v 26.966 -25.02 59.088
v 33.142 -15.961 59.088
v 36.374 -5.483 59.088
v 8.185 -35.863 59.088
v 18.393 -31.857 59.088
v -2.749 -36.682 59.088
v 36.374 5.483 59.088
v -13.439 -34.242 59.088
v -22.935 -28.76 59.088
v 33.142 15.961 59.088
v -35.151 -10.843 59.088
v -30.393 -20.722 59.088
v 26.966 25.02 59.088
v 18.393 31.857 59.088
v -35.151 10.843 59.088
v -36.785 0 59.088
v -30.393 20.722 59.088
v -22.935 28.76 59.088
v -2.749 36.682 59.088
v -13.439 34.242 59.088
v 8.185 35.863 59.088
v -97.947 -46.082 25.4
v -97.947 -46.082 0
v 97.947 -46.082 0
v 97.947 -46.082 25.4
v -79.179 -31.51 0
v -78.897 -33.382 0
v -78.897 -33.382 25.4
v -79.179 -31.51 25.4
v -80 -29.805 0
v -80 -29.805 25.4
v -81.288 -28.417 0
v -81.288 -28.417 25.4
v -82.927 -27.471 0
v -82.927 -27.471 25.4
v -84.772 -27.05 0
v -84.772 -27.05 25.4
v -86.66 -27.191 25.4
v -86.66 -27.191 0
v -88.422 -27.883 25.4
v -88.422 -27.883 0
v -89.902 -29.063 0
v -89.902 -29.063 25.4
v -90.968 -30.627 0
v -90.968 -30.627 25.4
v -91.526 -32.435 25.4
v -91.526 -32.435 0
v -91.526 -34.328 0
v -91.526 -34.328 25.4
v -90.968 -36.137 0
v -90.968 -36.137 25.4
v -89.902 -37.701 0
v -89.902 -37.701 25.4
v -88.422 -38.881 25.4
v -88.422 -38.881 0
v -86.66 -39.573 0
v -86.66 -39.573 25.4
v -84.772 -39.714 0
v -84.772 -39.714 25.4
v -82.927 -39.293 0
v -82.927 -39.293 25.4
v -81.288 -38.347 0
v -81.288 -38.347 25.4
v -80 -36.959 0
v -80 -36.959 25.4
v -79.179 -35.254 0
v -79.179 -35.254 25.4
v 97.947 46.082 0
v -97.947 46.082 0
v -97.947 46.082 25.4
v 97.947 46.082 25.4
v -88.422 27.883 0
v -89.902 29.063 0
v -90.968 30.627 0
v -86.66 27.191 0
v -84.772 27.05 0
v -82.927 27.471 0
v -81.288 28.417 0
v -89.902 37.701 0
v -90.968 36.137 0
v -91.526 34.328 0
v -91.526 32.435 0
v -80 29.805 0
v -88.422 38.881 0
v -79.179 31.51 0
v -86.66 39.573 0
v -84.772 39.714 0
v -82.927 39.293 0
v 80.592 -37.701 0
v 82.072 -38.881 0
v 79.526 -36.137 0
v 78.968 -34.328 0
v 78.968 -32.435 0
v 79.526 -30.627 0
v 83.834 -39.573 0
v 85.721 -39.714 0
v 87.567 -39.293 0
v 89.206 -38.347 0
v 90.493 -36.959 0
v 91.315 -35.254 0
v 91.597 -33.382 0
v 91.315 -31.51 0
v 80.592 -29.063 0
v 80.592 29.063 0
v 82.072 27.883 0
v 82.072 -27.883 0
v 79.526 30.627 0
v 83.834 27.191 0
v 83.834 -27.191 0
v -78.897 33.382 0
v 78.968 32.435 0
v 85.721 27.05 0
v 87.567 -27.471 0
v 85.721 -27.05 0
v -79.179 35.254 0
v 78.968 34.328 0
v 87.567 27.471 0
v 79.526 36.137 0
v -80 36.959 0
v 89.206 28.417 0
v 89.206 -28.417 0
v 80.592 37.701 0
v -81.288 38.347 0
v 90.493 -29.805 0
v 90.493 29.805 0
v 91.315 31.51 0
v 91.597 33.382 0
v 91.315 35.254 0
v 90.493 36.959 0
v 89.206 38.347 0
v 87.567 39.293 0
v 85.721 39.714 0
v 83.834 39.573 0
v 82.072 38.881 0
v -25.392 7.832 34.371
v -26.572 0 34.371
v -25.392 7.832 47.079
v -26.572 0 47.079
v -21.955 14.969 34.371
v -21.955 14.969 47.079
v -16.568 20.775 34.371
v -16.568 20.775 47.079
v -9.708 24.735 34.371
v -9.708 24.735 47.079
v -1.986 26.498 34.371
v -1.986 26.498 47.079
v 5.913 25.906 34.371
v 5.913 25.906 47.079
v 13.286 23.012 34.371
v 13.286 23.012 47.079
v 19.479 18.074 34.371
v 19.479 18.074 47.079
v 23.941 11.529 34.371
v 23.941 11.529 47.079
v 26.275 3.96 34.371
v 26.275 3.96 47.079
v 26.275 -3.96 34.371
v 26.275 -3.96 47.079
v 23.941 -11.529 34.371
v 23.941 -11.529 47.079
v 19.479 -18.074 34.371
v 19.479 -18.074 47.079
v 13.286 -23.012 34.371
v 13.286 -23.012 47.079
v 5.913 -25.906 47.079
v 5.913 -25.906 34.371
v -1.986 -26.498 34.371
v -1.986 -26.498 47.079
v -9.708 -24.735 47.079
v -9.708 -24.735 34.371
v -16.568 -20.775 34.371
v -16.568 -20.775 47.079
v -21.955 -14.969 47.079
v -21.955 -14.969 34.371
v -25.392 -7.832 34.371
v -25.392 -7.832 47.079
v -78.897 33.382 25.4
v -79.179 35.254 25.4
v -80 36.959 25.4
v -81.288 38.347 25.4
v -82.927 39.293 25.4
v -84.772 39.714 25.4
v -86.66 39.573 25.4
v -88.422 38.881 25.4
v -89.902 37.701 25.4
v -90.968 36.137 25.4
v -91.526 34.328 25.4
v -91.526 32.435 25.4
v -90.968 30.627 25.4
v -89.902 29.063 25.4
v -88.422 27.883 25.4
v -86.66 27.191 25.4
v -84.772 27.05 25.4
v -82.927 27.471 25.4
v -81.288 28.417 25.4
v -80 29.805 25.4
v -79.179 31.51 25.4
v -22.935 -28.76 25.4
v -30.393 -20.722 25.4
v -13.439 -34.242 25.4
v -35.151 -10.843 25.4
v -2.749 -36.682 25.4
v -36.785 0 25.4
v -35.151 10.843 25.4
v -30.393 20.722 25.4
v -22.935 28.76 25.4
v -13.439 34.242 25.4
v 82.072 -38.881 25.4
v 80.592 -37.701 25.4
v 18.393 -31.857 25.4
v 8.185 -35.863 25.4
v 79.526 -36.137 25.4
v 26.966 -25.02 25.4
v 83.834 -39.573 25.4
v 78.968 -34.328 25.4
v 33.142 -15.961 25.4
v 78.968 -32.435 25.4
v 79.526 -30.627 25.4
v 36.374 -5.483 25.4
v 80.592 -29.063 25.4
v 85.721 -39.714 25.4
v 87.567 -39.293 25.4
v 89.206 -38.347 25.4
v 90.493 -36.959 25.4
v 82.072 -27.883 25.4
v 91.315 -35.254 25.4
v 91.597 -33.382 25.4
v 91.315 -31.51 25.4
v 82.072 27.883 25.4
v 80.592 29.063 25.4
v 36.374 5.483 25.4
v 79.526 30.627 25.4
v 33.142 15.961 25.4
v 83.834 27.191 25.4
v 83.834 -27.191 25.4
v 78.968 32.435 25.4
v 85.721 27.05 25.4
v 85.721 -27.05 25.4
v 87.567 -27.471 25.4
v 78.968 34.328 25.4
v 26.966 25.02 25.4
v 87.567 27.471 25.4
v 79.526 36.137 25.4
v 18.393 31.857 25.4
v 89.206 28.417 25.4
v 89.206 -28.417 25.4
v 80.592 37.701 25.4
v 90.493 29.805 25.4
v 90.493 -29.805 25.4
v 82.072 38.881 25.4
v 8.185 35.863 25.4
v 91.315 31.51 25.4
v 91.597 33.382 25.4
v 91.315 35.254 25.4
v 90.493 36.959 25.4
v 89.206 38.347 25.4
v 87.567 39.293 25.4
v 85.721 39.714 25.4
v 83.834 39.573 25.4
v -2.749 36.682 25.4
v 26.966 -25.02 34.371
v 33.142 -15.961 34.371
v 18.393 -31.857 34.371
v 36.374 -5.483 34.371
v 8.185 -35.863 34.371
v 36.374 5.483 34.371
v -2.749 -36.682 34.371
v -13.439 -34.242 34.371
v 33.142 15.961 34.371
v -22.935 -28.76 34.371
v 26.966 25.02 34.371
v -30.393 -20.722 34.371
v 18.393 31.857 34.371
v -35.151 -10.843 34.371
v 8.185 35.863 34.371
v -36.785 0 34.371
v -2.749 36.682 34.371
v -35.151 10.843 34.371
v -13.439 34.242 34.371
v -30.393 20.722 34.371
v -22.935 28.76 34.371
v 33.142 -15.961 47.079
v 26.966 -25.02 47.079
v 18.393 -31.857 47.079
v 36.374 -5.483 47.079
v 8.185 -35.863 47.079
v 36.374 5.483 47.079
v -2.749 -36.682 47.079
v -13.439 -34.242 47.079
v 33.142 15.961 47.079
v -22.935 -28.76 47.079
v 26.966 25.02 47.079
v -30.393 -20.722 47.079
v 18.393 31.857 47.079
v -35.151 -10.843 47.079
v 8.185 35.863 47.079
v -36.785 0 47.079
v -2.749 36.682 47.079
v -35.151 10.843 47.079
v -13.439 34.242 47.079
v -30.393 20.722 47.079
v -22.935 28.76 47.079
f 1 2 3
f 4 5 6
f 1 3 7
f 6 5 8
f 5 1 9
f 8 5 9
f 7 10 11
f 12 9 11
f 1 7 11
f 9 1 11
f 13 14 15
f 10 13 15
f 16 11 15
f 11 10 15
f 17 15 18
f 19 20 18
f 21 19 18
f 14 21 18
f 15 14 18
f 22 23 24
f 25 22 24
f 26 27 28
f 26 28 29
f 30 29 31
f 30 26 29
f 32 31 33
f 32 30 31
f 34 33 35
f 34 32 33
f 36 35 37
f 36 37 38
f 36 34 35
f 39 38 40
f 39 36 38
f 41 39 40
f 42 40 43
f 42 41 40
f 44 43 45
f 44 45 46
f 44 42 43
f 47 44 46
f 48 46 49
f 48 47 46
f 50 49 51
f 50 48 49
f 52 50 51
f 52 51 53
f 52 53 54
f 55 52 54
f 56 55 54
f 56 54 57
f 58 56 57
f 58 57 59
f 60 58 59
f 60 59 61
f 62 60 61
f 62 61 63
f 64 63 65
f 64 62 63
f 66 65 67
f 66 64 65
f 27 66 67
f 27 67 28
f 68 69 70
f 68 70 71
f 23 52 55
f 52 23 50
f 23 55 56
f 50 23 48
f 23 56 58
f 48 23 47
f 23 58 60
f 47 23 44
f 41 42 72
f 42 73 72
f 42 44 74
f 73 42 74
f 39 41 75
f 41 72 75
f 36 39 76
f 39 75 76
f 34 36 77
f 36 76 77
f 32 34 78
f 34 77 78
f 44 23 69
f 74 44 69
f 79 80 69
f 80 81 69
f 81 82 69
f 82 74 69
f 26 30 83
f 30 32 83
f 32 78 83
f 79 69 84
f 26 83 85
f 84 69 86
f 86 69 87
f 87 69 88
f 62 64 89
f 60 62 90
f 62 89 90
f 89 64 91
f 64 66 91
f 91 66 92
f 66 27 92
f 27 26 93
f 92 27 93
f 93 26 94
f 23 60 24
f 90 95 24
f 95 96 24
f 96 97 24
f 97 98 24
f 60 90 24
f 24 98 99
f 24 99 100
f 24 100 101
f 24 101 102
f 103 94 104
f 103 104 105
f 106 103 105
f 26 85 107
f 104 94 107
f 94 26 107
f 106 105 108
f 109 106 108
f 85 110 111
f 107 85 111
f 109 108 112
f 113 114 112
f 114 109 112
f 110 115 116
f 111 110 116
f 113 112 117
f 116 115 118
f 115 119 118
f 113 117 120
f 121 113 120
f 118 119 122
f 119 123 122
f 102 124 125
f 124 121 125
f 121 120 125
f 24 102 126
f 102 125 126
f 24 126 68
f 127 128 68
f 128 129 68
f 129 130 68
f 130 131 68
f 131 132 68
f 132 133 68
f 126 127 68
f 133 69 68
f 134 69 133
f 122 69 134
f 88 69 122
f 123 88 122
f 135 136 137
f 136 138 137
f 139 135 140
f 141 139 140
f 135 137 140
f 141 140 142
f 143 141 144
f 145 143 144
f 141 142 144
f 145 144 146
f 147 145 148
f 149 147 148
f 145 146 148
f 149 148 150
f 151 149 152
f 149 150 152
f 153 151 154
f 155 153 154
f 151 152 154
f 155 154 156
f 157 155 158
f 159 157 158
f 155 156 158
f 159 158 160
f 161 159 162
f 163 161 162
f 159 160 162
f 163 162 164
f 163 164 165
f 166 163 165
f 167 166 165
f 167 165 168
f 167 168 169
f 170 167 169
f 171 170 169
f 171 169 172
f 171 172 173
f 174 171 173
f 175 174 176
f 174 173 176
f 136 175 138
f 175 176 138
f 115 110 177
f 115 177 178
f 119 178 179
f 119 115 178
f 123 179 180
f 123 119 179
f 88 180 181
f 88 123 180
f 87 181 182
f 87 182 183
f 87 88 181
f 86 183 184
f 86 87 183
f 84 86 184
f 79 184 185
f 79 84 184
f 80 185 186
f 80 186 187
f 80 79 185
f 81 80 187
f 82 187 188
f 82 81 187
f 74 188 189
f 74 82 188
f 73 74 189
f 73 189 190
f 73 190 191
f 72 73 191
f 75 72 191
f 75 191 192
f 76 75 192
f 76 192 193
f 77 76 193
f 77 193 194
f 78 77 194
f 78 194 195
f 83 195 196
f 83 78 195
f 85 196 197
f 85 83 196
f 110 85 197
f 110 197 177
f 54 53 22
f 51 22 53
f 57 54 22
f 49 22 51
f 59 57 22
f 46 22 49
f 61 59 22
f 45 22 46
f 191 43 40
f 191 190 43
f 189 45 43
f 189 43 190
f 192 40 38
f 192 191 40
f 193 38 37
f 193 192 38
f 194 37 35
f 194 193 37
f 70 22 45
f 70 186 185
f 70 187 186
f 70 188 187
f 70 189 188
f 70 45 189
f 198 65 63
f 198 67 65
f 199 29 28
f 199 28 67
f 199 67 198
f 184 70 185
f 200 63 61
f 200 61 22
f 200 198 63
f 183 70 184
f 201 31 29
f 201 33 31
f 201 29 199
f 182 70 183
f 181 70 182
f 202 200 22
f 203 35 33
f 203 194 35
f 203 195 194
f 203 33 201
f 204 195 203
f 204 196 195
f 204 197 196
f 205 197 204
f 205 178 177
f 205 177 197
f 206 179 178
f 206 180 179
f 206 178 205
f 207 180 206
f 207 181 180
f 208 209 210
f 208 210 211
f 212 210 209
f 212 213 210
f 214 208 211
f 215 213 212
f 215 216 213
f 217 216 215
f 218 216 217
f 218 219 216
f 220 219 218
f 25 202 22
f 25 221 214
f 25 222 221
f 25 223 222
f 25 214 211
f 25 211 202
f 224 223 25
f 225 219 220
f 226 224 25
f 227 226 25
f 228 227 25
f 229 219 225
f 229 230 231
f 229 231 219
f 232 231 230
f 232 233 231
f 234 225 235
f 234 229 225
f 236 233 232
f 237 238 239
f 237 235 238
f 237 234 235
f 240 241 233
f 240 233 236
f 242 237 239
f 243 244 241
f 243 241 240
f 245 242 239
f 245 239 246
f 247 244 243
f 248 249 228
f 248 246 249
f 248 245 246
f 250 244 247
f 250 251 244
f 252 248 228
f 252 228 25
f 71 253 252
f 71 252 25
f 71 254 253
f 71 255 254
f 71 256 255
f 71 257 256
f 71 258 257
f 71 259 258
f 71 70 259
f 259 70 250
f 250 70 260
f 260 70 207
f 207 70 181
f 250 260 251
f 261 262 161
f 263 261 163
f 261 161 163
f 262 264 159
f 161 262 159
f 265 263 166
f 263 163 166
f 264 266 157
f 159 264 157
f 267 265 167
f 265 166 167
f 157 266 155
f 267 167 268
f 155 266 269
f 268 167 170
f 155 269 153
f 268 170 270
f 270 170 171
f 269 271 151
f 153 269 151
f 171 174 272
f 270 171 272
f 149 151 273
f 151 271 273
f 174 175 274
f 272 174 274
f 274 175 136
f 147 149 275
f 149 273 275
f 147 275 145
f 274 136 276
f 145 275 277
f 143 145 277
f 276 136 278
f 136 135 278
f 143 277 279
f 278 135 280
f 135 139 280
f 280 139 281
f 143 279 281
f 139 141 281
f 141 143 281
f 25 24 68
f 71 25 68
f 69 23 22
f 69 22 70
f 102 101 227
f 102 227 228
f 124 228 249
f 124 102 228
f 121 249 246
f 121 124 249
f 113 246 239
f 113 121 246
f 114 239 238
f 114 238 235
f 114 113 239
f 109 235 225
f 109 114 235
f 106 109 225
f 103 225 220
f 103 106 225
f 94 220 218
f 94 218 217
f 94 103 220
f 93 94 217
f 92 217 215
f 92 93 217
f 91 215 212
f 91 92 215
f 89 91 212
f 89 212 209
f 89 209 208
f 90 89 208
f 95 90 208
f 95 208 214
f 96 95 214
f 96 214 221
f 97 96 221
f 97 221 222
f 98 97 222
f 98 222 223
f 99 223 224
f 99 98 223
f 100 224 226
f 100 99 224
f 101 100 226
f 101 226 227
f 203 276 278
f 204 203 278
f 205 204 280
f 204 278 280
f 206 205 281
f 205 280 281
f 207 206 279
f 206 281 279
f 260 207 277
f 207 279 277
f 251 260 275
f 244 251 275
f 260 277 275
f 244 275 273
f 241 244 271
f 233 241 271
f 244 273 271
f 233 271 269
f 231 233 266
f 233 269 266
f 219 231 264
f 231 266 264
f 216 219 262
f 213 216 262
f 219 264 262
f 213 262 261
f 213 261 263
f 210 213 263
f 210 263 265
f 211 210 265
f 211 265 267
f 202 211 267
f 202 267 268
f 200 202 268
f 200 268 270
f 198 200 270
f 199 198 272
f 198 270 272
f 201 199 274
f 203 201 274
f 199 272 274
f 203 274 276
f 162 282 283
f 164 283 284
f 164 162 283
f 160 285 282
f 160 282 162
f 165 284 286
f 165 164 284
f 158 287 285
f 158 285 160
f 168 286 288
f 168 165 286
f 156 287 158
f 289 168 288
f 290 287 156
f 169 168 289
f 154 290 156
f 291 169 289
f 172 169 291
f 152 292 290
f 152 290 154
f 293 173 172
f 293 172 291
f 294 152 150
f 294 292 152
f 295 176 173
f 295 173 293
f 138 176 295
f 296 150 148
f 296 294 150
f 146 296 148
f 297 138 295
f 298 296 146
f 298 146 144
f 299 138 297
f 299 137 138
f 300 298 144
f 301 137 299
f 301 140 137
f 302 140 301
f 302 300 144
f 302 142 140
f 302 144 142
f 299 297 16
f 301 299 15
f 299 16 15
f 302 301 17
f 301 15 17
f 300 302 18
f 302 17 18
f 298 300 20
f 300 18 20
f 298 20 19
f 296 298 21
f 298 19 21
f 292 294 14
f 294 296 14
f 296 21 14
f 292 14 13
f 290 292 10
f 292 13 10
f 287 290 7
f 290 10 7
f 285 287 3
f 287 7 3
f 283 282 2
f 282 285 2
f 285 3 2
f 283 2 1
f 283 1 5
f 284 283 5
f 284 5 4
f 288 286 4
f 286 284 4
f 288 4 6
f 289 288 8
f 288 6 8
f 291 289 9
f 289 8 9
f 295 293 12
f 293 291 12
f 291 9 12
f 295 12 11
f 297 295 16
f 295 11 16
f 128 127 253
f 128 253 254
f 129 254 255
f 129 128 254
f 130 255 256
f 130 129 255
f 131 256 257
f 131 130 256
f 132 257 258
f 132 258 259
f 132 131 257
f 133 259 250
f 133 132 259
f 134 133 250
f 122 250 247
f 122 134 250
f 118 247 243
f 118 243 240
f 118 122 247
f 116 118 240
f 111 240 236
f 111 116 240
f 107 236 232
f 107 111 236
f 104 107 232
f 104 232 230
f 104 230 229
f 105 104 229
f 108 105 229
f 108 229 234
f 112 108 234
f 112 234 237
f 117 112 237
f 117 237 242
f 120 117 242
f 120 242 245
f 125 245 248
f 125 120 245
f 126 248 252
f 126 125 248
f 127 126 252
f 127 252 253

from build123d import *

# Parameters (mm, degrees)
F0_W     = 195.8933323622
F0_H     = 92.163823545
F1_DEPTH = 25.4
F2_R     = 6.35
F3_DEPTH = 25.4
F4_W     = 36.7853008211
F4_H     = 33.6875878274
F6_W     = 25.4169069231
F6_H     = 12.7084553242


with BuildPart() as f1:
    # F0 (on Top) → F1 (new body)
    with BuildSketch(Plane.XY):
        Rectangle(F0_W, F0_H)
    extrude(amount=F1_DEPTH)

    # F2 (on Top) → F3 (cut)
    with BuildSketch(Plane.XY):
        with Locations((-85.2466661811, 33.3819117725)):
            Circle(F2_R)
        with Locations((-85.2466661811, -33.3819117725)):
            Circle(F2_R)
        with Locations((85.2466661811, 33.3819117725)):
            Circle(F2_R)
        with Locations((85.2466661811, -33.3819117725)):
            Circle(F2_R)
    extrude(amount=F3_DEPTH, mode=Mode.SUBTRACT)

    # F4 (on Front) → F5 (revolve)
    with BuildSketch(Plane.XZ):
        with Locations((-18.3926504105, 42.2437939137)):
            Rectangle(F4_W, F4_H)
    revolve(axis=Axis((0, 0, 42.2437939137), (0, 0, -1)))

    # F6 (on Front) → F7 (revolve, cut)
    with BuildSketch(Plane.XZ):
        with Locations((-39.2806772143, 40.7248176634)):
            Rectangle(F6_W, F6_H)
    revolve(axis=Axis((0, 0, 59.0875878274), (0, 0, -1)), mode=Mode.SUBTRACT)


solid = f1.part
